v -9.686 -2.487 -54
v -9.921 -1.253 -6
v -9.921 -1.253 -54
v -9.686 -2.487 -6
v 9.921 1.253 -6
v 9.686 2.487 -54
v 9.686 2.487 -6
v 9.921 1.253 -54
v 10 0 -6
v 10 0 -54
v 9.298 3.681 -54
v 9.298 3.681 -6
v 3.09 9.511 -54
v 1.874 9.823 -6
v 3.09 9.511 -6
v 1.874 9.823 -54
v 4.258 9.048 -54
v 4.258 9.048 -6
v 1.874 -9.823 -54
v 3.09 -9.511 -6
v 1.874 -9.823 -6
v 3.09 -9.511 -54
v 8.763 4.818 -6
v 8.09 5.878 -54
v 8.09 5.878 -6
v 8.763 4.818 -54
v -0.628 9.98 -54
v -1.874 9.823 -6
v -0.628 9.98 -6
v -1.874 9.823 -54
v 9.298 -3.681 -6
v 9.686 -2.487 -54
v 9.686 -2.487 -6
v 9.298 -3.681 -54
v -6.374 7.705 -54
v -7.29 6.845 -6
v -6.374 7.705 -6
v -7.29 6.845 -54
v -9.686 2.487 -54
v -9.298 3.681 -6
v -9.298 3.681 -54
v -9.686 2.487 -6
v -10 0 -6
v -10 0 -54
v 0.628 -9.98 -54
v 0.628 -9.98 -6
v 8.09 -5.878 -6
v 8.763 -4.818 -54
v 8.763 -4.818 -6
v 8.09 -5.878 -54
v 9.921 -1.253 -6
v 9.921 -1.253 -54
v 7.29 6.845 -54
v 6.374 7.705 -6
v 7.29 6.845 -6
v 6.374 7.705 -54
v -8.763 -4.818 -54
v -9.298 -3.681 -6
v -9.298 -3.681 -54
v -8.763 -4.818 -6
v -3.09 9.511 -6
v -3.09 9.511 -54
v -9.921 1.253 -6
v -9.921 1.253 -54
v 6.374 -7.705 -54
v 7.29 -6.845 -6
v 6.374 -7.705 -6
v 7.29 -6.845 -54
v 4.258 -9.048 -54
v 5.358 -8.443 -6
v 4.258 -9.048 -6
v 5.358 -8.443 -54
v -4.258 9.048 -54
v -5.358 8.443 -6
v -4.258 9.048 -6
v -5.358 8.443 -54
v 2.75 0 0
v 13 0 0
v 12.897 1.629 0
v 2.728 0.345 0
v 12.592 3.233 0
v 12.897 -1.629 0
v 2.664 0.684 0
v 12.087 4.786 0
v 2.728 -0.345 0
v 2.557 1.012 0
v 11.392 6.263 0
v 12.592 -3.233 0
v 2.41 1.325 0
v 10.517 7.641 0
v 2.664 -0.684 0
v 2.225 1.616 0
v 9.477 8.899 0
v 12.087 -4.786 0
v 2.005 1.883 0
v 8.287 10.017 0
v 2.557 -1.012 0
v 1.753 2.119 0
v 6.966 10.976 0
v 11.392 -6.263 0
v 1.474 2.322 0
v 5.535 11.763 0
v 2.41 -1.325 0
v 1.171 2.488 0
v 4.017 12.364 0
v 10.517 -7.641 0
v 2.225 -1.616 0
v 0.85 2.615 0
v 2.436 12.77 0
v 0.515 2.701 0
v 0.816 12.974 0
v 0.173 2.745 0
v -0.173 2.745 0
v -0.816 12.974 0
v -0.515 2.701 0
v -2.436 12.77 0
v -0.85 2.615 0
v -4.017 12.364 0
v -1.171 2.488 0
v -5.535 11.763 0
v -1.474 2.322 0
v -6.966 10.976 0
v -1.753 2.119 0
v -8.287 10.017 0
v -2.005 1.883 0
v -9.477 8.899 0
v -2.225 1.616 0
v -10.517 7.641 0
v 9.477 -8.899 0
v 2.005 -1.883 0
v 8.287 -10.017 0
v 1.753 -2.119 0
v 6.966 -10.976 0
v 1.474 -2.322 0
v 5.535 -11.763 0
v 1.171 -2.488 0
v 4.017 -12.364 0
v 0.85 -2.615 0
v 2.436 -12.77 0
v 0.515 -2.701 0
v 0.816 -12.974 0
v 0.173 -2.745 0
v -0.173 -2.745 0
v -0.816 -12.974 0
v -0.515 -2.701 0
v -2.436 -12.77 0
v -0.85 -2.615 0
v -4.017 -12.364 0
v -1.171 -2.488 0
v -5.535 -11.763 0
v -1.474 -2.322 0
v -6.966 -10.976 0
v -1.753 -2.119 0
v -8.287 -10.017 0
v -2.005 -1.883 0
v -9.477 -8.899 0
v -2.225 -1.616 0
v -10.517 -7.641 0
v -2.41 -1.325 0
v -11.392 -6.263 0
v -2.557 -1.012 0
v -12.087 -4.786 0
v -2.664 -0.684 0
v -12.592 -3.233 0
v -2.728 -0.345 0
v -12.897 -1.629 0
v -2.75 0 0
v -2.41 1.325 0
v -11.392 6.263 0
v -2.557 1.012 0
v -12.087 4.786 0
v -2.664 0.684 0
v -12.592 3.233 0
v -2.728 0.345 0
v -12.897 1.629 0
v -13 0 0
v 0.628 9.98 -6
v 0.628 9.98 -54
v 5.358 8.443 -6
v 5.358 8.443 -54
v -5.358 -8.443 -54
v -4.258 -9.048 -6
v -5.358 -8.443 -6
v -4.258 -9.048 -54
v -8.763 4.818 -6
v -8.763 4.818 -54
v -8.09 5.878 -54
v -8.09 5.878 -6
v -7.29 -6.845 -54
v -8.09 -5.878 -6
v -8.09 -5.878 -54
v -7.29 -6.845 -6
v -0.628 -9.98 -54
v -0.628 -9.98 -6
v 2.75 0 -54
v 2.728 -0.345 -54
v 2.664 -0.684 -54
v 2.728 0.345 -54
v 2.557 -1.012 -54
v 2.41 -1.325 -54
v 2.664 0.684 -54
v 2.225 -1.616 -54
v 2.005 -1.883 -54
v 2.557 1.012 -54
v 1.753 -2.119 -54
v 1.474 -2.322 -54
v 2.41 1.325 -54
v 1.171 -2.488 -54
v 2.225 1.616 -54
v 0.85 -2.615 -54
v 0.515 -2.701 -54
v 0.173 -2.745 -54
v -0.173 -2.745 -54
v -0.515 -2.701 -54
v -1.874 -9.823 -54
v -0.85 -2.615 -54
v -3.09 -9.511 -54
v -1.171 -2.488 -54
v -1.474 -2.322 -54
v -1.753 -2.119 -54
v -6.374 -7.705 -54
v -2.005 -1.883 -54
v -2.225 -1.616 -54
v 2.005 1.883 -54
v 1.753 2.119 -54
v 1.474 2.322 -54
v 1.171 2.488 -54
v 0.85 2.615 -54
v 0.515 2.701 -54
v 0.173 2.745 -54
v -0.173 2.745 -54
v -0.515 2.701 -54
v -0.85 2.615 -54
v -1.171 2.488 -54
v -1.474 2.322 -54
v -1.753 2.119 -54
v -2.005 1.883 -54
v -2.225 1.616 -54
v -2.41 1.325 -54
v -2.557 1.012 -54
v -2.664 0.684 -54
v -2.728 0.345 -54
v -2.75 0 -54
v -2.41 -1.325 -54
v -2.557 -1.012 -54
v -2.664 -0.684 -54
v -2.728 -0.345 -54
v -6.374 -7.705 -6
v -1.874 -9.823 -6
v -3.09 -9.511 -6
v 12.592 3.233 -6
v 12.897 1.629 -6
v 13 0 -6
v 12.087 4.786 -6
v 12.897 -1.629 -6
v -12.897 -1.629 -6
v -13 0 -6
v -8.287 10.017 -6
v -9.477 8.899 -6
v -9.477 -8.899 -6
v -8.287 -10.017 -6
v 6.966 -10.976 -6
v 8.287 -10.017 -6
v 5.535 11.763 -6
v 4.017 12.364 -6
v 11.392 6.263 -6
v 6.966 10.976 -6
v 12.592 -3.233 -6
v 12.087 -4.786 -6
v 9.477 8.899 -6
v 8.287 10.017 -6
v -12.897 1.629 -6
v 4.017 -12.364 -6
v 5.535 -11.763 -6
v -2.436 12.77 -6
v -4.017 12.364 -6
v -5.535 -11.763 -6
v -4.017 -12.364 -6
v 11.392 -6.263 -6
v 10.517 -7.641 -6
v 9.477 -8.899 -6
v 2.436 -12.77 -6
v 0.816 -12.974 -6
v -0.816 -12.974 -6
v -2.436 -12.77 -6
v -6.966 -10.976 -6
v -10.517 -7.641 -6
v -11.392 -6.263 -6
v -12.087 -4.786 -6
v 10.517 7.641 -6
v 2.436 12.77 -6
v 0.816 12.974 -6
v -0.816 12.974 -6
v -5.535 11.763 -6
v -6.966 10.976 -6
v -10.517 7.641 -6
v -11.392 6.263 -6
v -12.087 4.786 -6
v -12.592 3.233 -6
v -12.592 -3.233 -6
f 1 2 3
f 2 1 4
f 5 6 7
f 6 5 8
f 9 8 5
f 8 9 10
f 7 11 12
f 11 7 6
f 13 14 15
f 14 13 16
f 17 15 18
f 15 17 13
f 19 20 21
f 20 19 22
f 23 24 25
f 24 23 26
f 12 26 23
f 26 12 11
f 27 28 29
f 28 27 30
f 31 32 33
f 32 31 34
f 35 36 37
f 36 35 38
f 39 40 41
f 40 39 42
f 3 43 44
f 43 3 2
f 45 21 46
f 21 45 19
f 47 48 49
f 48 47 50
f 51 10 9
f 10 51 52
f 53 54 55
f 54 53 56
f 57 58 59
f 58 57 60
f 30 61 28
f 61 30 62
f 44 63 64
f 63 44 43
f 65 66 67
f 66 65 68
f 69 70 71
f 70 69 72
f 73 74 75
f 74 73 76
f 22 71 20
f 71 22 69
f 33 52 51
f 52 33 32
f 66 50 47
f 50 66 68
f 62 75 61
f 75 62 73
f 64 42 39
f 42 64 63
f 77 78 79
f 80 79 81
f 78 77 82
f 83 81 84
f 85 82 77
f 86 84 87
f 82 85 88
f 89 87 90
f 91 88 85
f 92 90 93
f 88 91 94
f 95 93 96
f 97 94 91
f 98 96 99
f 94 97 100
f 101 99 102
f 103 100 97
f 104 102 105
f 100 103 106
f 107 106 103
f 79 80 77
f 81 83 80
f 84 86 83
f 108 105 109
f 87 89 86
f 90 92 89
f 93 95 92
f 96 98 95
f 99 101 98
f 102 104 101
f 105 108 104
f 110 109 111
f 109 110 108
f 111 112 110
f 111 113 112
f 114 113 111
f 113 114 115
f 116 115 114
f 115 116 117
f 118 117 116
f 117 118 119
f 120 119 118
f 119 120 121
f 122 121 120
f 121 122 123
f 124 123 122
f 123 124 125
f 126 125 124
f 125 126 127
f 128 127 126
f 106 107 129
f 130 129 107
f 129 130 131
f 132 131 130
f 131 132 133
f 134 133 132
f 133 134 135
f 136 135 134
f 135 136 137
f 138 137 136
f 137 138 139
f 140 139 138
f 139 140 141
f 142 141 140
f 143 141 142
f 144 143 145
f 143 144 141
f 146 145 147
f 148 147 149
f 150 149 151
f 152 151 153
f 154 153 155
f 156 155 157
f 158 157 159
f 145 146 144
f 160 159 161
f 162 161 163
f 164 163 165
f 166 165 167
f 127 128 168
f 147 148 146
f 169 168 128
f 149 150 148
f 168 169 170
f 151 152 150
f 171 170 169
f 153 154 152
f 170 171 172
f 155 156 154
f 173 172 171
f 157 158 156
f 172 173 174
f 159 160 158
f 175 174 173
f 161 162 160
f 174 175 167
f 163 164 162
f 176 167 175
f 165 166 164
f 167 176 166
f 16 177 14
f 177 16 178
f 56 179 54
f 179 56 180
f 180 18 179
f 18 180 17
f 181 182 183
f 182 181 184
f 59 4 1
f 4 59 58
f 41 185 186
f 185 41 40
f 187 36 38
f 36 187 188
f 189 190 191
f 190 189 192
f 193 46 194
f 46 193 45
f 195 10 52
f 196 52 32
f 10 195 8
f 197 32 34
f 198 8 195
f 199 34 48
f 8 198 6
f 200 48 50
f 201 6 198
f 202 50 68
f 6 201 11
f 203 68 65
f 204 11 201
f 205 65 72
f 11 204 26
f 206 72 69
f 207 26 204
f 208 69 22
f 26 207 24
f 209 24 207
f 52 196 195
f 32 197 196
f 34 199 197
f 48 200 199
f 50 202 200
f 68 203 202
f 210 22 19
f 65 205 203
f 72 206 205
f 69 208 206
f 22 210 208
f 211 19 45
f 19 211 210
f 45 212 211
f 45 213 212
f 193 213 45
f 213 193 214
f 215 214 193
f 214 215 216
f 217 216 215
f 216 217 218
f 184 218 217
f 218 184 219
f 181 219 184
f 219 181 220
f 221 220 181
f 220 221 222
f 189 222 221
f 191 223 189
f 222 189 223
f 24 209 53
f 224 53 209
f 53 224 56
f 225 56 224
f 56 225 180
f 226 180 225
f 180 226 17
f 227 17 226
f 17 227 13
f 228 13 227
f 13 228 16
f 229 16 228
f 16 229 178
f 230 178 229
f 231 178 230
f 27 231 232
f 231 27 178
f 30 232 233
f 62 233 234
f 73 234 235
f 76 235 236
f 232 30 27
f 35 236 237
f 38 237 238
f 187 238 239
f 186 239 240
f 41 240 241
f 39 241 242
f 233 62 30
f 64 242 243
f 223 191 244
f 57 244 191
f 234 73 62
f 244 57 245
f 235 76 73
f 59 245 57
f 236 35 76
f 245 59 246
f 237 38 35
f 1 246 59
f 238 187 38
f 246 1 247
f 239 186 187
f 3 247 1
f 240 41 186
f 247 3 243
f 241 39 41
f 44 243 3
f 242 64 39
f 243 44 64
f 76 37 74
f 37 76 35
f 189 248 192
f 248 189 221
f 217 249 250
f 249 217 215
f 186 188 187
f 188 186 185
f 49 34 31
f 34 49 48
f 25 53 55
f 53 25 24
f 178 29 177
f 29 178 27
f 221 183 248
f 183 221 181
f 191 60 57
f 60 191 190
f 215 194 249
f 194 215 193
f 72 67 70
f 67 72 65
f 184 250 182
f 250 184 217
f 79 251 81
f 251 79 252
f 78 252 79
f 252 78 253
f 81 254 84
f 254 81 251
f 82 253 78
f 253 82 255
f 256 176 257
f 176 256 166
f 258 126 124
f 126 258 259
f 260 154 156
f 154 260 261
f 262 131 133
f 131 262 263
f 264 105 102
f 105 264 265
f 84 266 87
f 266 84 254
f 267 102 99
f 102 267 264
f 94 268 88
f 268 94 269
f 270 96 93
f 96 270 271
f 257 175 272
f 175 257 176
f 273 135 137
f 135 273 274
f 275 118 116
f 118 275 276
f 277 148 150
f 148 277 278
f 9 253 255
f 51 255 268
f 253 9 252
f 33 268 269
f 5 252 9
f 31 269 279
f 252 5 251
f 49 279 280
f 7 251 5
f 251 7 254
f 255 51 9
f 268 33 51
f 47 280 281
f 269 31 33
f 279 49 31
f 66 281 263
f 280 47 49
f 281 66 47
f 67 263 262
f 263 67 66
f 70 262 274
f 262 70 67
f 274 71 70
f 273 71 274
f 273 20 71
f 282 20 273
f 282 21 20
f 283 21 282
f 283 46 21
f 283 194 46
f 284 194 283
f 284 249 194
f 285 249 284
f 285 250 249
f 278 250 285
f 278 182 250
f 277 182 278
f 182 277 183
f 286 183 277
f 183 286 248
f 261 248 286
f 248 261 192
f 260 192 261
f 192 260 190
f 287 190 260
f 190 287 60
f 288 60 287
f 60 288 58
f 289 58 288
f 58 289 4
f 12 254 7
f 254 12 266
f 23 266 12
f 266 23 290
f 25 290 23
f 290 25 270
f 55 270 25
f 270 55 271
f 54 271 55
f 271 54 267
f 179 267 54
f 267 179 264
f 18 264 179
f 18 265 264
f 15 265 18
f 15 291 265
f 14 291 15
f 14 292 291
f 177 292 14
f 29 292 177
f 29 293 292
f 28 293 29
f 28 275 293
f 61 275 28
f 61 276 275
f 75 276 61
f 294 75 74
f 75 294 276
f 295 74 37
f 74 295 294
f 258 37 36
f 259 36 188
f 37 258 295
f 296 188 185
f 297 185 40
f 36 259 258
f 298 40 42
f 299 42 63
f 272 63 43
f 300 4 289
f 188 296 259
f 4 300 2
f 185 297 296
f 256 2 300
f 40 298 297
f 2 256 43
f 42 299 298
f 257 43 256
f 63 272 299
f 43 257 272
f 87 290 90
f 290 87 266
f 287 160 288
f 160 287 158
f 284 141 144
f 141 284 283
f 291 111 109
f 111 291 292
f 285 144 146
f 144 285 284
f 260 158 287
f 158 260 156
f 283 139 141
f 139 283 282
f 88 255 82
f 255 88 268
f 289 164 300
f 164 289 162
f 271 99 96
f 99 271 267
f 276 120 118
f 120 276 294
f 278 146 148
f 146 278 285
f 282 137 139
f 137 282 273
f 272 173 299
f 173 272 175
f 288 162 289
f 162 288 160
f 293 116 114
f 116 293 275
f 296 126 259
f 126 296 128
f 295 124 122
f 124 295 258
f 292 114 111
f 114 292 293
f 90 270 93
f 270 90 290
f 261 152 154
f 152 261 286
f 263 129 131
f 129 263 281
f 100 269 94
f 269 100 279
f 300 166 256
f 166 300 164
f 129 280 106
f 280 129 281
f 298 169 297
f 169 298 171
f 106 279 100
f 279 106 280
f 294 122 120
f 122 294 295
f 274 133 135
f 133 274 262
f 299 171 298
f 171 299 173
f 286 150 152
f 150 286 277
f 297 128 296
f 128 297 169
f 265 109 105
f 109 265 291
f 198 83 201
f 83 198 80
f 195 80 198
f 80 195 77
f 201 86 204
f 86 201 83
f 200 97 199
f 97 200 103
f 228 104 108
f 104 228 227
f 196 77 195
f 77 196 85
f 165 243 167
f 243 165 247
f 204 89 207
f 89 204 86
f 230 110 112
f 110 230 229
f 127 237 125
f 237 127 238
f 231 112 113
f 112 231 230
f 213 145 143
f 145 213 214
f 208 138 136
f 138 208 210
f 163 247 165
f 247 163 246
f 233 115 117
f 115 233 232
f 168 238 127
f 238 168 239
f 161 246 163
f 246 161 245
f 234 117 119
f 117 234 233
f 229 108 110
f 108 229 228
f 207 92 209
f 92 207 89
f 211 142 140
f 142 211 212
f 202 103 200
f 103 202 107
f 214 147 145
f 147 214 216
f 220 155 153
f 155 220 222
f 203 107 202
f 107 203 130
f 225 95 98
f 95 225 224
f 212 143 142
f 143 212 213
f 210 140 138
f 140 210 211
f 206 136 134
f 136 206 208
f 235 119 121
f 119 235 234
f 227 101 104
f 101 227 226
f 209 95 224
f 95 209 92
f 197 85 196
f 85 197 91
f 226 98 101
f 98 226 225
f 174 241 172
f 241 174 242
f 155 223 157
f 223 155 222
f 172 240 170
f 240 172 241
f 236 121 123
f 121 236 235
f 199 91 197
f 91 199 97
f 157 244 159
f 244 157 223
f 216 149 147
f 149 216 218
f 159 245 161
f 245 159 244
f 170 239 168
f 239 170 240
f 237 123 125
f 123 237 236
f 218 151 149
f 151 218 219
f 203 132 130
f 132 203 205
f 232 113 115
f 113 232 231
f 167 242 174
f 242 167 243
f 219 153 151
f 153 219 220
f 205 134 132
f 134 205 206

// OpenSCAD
$fn = 50;


difference() {
	union() {
		translate(v = [0, 0, -54.0000000000]) {
			cylinder(h = 54, r = 10.0000000000);
		}
		translate(v = [0, 0, -6.0000000000]) {
			cylinder(h = 6, r = 13.0000000000);
		}
	}
	union() {
		#translate(v = [0, 0, -54]) {
			cylinder(h = 54, r = 2.7500000000);
		}
	}
}
